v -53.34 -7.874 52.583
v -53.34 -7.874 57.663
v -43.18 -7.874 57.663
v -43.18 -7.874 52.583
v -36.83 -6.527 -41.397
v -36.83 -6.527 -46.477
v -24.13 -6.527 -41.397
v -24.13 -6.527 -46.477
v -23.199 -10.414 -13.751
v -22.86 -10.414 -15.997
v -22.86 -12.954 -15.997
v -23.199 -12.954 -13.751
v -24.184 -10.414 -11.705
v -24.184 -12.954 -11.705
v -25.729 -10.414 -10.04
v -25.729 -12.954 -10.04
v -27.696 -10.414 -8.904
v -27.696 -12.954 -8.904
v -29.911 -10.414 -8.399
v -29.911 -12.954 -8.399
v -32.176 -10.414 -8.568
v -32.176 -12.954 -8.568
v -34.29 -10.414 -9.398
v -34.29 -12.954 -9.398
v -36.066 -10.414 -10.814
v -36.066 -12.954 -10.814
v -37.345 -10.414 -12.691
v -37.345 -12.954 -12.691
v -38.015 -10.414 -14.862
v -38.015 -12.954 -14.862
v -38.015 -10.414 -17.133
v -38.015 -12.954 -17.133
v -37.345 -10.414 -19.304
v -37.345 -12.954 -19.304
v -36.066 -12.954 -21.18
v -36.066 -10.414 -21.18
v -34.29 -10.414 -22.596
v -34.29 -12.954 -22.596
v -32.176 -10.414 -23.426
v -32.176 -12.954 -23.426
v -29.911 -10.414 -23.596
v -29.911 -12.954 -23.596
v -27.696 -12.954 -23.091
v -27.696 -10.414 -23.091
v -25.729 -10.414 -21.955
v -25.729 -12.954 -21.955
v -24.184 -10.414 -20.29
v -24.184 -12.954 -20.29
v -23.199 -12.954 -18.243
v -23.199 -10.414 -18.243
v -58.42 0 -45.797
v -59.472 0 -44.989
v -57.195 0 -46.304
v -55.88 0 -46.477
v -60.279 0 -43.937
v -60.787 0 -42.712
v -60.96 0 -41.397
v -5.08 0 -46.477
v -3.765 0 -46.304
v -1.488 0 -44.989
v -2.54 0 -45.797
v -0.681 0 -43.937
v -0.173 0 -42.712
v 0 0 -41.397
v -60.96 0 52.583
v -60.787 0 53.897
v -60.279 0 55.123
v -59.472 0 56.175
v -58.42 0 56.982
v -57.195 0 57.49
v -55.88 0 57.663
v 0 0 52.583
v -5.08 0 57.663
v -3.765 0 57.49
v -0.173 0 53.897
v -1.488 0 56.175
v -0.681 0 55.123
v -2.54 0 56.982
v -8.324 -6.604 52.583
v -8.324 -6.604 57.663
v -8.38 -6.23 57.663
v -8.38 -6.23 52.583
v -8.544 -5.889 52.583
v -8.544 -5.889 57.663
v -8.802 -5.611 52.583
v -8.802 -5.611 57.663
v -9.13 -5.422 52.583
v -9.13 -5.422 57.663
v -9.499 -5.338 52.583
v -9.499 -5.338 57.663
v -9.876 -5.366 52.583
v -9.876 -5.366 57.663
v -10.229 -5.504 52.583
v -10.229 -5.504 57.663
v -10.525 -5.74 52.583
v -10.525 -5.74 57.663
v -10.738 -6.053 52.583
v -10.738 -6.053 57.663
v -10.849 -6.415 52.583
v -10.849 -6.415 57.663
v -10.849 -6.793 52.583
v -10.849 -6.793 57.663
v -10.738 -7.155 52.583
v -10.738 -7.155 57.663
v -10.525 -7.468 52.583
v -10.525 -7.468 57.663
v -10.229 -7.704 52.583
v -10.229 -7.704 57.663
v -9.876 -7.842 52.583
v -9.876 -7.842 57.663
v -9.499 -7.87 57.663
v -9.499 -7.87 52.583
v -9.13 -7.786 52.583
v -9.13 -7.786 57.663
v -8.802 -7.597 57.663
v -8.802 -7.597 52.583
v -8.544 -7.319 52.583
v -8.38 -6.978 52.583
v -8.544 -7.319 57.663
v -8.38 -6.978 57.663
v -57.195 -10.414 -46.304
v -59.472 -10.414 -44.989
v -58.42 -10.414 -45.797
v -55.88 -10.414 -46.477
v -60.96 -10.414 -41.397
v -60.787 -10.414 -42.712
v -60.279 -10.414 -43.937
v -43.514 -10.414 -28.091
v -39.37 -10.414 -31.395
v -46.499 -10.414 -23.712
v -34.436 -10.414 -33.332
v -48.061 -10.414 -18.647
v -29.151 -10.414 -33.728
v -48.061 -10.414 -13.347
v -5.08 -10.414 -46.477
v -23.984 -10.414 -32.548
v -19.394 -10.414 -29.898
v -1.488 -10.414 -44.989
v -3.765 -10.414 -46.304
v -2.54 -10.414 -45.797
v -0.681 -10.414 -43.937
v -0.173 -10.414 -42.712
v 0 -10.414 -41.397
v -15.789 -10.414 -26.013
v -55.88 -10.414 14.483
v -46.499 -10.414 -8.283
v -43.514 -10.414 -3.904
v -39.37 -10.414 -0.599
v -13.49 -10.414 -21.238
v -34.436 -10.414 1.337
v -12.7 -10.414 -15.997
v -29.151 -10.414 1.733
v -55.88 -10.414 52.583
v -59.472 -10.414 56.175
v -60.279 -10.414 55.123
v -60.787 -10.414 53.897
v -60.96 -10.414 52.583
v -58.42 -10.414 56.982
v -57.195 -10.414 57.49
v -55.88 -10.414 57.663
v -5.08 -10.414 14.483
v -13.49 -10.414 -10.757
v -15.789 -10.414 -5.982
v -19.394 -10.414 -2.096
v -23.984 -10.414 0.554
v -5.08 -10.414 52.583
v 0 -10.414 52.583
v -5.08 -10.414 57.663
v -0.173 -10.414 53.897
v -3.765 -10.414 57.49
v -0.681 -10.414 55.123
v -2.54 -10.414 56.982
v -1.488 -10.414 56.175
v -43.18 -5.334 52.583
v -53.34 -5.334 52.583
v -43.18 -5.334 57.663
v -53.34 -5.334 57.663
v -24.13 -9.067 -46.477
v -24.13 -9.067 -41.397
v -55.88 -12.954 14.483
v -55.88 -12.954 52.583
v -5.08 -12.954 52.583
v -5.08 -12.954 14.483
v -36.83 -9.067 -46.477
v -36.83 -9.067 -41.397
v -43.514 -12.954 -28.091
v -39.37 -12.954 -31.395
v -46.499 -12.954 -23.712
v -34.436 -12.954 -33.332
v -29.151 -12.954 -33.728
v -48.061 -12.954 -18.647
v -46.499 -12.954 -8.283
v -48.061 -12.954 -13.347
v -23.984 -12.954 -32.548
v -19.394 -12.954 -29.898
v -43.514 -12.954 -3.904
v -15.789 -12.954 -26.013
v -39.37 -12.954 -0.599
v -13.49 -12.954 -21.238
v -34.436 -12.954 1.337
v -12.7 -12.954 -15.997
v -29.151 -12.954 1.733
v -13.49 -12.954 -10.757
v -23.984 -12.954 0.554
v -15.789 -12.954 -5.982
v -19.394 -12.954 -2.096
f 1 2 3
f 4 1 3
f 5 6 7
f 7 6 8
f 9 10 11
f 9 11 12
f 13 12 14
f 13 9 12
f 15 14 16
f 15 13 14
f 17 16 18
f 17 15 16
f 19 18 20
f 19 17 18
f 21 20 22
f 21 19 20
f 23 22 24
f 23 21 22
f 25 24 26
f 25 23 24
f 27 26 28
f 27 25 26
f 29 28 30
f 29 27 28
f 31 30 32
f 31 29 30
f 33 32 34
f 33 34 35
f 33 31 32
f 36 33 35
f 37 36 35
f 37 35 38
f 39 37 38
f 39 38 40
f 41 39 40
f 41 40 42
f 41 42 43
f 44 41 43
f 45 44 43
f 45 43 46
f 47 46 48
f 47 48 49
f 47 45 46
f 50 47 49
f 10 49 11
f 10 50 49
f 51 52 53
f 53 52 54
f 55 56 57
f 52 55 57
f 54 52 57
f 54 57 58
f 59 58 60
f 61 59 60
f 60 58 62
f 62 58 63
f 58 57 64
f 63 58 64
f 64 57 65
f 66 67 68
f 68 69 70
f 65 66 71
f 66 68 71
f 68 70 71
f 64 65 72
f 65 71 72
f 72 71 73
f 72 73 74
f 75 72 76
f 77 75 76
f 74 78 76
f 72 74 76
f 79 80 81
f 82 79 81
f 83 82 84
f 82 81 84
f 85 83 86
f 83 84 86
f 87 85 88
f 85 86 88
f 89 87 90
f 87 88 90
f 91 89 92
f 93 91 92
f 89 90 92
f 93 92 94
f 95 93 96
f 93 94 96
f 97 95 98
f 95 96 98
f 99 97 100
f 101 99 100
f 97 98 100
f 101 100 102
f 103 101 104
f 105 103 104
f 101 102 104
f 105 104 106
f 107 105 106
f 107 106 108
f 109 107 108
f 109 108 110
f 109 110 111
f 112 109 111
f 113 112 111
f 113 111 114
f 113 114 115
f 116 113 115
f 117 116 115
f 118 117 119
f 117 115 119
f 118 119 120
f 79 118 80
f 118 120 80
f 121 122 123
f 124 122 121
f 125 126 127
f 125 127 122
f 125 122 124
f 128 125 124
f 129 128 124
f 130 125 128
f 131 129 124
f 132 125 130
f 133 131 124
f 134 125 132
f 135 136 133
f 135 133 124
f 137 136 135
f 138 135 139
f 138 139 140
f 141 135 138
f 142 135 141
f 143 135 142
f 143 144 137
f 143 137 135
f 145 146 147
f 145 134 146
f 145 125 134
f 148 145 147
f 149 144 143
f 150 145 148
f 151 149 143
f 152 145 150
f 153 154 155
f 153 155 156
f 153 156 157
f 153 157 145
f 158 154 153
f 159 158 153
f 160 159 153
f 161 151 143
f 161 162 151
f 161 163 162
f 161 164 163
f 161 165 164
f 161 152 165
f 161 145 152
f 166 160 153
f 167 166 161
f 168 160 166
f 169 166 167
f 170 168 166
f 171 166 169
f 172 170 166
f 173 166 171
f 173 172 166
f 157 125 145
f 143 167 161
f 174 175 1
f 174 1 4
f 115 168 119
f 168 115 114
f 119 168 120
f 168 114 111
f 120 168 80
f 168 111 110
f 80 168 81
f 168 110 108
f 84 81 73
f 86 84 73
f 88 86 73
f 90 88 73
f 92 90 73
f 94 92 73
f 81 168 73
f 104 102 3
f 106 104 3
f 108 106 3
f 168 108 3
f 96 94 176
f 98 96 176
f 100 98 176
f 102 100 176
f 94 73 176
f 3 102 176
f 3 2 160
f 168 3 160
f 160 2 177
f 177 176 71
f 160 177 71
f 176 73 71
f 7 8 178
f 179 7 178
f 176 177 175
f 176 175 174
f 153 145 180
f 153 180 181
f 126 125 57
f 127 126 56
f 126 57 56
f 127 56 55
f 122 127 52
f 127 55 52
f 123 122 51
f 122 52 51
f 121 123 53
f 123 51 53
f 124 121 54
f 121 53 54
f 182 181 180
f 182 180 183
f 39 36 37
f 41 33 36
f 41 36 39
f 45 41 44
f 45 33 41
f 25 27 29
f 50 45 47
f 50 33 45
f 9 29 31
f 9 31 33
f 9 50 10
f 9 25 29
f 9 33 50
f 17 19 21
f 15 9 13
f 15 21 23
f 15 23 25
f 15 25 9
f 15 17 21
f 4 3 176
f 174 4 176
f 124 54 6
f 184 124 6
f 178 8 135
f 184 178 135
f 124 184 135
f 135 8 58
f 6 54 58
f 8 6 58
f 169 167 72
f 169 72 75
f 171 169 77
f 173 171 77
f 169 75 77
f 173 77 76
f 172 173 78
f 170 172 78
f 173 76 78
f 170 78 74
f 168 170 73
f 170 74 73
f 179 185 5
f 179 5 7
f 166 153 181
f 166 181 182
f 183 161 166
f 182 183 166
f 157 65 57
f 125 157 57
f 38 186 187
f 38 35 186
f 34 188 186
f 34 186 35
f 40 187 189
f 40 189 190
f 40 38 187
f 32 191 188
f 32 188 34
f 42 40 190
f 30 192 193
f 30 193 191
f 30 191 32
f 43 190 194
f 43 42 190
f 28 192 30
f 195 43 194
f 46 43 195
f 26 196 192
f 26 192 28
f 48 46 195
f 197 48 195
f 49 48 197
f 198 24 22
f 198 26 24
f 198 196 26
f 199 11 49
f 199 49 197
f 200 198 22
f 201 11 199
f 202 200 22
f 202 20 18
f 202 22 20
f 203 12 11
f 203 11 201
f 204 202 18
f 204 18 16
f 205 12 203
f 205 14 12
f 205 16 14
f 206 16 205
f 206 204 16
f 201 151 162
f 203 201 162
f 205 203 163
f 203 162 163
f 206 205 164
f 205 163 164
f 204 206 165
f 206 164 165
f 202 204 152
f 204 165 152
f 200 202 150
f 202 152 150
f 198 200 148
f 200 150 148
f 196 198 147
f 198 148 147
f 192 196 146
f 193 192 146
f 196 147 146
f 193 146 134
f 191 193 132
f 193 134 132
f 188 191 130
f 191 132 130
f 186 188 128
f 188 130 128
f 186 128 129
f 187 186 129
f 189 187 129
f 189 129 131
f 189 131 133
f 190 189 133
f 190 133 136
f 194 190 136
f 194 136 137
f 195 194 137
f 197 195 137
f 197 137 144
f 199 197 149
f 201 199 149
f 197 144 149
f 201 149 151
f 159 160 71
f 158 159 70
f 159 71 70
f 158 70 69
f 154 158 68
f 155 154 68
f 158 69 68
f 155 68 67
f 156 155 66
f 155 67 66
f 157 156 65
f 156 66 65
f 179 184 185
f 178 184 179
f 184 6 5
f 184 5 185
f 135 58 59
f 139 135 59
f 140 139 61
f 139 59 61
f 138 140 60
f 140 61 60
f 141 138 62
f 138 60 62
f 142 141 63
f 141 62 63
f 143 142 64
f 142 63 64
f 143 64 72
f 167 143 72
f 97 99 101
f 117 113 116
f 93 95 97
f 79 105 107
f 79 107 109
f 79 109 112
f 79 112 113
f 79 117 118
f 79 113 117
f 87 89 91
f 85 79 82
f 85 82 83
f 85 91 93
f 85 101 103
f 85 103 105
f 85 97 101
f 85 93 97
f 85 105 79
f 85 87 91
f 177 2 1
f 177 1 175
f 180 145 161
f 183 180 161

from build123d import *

# Parameters (mm, degrees)
F1_DEPTH = 10.414
F2_W     = 50.8
F2_H     = 38.1
F2_R     = 17.78
F2_R_2   = 7.62
F3_DEPTH = 2.54
F4_W     = 10.16
F4_H     = 2.54
F4_R     = 1.27
F5_DEPTH = 5.08
F6_W     = 12.7
F6_H     = 2.54
F7_DEPTH = 5.08


with BuildPart() as f1:
    # F0 (on Front) → F1 (new body)
    with BuildSketch(Plane.XZ):
        with BuildLine():
            Line((-5.08, 57.662666), (-55.88, 57.662666))
            ThreePointArc((-55.88, 57.662666), (-59.472102, 56.174768), (-60.96, 52.582666))
            Line((-60.96, 52.582666), (-60.96, -41.397334))
            ThreePointArc((-60.96, -41.397334), (-59.472102, -44.989437), (-55.88, -46.477334))
            Line((-55.88, -46.477334), (-5.08, -46.477334))
            ThreePointArc((-5.08, -46.477334), (-1.487898, -44.989437), (0, -41.397334))
            Line((0, -41.397334), (0, 52.582666))
            ThreePointArc((0, 52.582666), (-1.487898, 56.174768), (-5.08, 57.662666))
        make_face()
    extrude(amount=F1_DEPTH)

    # F2 (on face) → F3 (join)
    with BuildSketch(Plane.XZ.offset(10.414)):
        with Locations((-30.48, 33.532666)):
            Rectangle(F2_W, F2_H)
        with Locations((-30.48, -15.997334)):
            Circle(F2_R)
        with Locations((-30.48, -15.997334)):
            Circle(F2_R_2, mode=Mode.SUBTRACT)
    extrude(amount=F3_DEPTH)

    # F4 (on face) → F5 (cut)
    with BuildSketch(Plane.XY.offset(57.662666)):
        with Locations((-48.26, -6.604)):
            Rectangle(F4_W, F4_H)
        with Locations((-9.593616, -6.604)):
            Circle(F4_R)
    extrude(amount=-F5_DEPTH, mode=Mode.SUBTRACT)

    # F6 (on face) → F7 (cut)
    with BuildSketch(Plane(origin=(0, 0, -46.477334), x_dir=(1, 0, 0), z_dir=(0, 0, -1))):
        with Locations((-30.48, 7.796658)):
            Rectangle(F6_W, F6_H)
    extrude(amount=-F7_DEPTH, mode=Mode.SUBTRACT)


solid = f1.part
